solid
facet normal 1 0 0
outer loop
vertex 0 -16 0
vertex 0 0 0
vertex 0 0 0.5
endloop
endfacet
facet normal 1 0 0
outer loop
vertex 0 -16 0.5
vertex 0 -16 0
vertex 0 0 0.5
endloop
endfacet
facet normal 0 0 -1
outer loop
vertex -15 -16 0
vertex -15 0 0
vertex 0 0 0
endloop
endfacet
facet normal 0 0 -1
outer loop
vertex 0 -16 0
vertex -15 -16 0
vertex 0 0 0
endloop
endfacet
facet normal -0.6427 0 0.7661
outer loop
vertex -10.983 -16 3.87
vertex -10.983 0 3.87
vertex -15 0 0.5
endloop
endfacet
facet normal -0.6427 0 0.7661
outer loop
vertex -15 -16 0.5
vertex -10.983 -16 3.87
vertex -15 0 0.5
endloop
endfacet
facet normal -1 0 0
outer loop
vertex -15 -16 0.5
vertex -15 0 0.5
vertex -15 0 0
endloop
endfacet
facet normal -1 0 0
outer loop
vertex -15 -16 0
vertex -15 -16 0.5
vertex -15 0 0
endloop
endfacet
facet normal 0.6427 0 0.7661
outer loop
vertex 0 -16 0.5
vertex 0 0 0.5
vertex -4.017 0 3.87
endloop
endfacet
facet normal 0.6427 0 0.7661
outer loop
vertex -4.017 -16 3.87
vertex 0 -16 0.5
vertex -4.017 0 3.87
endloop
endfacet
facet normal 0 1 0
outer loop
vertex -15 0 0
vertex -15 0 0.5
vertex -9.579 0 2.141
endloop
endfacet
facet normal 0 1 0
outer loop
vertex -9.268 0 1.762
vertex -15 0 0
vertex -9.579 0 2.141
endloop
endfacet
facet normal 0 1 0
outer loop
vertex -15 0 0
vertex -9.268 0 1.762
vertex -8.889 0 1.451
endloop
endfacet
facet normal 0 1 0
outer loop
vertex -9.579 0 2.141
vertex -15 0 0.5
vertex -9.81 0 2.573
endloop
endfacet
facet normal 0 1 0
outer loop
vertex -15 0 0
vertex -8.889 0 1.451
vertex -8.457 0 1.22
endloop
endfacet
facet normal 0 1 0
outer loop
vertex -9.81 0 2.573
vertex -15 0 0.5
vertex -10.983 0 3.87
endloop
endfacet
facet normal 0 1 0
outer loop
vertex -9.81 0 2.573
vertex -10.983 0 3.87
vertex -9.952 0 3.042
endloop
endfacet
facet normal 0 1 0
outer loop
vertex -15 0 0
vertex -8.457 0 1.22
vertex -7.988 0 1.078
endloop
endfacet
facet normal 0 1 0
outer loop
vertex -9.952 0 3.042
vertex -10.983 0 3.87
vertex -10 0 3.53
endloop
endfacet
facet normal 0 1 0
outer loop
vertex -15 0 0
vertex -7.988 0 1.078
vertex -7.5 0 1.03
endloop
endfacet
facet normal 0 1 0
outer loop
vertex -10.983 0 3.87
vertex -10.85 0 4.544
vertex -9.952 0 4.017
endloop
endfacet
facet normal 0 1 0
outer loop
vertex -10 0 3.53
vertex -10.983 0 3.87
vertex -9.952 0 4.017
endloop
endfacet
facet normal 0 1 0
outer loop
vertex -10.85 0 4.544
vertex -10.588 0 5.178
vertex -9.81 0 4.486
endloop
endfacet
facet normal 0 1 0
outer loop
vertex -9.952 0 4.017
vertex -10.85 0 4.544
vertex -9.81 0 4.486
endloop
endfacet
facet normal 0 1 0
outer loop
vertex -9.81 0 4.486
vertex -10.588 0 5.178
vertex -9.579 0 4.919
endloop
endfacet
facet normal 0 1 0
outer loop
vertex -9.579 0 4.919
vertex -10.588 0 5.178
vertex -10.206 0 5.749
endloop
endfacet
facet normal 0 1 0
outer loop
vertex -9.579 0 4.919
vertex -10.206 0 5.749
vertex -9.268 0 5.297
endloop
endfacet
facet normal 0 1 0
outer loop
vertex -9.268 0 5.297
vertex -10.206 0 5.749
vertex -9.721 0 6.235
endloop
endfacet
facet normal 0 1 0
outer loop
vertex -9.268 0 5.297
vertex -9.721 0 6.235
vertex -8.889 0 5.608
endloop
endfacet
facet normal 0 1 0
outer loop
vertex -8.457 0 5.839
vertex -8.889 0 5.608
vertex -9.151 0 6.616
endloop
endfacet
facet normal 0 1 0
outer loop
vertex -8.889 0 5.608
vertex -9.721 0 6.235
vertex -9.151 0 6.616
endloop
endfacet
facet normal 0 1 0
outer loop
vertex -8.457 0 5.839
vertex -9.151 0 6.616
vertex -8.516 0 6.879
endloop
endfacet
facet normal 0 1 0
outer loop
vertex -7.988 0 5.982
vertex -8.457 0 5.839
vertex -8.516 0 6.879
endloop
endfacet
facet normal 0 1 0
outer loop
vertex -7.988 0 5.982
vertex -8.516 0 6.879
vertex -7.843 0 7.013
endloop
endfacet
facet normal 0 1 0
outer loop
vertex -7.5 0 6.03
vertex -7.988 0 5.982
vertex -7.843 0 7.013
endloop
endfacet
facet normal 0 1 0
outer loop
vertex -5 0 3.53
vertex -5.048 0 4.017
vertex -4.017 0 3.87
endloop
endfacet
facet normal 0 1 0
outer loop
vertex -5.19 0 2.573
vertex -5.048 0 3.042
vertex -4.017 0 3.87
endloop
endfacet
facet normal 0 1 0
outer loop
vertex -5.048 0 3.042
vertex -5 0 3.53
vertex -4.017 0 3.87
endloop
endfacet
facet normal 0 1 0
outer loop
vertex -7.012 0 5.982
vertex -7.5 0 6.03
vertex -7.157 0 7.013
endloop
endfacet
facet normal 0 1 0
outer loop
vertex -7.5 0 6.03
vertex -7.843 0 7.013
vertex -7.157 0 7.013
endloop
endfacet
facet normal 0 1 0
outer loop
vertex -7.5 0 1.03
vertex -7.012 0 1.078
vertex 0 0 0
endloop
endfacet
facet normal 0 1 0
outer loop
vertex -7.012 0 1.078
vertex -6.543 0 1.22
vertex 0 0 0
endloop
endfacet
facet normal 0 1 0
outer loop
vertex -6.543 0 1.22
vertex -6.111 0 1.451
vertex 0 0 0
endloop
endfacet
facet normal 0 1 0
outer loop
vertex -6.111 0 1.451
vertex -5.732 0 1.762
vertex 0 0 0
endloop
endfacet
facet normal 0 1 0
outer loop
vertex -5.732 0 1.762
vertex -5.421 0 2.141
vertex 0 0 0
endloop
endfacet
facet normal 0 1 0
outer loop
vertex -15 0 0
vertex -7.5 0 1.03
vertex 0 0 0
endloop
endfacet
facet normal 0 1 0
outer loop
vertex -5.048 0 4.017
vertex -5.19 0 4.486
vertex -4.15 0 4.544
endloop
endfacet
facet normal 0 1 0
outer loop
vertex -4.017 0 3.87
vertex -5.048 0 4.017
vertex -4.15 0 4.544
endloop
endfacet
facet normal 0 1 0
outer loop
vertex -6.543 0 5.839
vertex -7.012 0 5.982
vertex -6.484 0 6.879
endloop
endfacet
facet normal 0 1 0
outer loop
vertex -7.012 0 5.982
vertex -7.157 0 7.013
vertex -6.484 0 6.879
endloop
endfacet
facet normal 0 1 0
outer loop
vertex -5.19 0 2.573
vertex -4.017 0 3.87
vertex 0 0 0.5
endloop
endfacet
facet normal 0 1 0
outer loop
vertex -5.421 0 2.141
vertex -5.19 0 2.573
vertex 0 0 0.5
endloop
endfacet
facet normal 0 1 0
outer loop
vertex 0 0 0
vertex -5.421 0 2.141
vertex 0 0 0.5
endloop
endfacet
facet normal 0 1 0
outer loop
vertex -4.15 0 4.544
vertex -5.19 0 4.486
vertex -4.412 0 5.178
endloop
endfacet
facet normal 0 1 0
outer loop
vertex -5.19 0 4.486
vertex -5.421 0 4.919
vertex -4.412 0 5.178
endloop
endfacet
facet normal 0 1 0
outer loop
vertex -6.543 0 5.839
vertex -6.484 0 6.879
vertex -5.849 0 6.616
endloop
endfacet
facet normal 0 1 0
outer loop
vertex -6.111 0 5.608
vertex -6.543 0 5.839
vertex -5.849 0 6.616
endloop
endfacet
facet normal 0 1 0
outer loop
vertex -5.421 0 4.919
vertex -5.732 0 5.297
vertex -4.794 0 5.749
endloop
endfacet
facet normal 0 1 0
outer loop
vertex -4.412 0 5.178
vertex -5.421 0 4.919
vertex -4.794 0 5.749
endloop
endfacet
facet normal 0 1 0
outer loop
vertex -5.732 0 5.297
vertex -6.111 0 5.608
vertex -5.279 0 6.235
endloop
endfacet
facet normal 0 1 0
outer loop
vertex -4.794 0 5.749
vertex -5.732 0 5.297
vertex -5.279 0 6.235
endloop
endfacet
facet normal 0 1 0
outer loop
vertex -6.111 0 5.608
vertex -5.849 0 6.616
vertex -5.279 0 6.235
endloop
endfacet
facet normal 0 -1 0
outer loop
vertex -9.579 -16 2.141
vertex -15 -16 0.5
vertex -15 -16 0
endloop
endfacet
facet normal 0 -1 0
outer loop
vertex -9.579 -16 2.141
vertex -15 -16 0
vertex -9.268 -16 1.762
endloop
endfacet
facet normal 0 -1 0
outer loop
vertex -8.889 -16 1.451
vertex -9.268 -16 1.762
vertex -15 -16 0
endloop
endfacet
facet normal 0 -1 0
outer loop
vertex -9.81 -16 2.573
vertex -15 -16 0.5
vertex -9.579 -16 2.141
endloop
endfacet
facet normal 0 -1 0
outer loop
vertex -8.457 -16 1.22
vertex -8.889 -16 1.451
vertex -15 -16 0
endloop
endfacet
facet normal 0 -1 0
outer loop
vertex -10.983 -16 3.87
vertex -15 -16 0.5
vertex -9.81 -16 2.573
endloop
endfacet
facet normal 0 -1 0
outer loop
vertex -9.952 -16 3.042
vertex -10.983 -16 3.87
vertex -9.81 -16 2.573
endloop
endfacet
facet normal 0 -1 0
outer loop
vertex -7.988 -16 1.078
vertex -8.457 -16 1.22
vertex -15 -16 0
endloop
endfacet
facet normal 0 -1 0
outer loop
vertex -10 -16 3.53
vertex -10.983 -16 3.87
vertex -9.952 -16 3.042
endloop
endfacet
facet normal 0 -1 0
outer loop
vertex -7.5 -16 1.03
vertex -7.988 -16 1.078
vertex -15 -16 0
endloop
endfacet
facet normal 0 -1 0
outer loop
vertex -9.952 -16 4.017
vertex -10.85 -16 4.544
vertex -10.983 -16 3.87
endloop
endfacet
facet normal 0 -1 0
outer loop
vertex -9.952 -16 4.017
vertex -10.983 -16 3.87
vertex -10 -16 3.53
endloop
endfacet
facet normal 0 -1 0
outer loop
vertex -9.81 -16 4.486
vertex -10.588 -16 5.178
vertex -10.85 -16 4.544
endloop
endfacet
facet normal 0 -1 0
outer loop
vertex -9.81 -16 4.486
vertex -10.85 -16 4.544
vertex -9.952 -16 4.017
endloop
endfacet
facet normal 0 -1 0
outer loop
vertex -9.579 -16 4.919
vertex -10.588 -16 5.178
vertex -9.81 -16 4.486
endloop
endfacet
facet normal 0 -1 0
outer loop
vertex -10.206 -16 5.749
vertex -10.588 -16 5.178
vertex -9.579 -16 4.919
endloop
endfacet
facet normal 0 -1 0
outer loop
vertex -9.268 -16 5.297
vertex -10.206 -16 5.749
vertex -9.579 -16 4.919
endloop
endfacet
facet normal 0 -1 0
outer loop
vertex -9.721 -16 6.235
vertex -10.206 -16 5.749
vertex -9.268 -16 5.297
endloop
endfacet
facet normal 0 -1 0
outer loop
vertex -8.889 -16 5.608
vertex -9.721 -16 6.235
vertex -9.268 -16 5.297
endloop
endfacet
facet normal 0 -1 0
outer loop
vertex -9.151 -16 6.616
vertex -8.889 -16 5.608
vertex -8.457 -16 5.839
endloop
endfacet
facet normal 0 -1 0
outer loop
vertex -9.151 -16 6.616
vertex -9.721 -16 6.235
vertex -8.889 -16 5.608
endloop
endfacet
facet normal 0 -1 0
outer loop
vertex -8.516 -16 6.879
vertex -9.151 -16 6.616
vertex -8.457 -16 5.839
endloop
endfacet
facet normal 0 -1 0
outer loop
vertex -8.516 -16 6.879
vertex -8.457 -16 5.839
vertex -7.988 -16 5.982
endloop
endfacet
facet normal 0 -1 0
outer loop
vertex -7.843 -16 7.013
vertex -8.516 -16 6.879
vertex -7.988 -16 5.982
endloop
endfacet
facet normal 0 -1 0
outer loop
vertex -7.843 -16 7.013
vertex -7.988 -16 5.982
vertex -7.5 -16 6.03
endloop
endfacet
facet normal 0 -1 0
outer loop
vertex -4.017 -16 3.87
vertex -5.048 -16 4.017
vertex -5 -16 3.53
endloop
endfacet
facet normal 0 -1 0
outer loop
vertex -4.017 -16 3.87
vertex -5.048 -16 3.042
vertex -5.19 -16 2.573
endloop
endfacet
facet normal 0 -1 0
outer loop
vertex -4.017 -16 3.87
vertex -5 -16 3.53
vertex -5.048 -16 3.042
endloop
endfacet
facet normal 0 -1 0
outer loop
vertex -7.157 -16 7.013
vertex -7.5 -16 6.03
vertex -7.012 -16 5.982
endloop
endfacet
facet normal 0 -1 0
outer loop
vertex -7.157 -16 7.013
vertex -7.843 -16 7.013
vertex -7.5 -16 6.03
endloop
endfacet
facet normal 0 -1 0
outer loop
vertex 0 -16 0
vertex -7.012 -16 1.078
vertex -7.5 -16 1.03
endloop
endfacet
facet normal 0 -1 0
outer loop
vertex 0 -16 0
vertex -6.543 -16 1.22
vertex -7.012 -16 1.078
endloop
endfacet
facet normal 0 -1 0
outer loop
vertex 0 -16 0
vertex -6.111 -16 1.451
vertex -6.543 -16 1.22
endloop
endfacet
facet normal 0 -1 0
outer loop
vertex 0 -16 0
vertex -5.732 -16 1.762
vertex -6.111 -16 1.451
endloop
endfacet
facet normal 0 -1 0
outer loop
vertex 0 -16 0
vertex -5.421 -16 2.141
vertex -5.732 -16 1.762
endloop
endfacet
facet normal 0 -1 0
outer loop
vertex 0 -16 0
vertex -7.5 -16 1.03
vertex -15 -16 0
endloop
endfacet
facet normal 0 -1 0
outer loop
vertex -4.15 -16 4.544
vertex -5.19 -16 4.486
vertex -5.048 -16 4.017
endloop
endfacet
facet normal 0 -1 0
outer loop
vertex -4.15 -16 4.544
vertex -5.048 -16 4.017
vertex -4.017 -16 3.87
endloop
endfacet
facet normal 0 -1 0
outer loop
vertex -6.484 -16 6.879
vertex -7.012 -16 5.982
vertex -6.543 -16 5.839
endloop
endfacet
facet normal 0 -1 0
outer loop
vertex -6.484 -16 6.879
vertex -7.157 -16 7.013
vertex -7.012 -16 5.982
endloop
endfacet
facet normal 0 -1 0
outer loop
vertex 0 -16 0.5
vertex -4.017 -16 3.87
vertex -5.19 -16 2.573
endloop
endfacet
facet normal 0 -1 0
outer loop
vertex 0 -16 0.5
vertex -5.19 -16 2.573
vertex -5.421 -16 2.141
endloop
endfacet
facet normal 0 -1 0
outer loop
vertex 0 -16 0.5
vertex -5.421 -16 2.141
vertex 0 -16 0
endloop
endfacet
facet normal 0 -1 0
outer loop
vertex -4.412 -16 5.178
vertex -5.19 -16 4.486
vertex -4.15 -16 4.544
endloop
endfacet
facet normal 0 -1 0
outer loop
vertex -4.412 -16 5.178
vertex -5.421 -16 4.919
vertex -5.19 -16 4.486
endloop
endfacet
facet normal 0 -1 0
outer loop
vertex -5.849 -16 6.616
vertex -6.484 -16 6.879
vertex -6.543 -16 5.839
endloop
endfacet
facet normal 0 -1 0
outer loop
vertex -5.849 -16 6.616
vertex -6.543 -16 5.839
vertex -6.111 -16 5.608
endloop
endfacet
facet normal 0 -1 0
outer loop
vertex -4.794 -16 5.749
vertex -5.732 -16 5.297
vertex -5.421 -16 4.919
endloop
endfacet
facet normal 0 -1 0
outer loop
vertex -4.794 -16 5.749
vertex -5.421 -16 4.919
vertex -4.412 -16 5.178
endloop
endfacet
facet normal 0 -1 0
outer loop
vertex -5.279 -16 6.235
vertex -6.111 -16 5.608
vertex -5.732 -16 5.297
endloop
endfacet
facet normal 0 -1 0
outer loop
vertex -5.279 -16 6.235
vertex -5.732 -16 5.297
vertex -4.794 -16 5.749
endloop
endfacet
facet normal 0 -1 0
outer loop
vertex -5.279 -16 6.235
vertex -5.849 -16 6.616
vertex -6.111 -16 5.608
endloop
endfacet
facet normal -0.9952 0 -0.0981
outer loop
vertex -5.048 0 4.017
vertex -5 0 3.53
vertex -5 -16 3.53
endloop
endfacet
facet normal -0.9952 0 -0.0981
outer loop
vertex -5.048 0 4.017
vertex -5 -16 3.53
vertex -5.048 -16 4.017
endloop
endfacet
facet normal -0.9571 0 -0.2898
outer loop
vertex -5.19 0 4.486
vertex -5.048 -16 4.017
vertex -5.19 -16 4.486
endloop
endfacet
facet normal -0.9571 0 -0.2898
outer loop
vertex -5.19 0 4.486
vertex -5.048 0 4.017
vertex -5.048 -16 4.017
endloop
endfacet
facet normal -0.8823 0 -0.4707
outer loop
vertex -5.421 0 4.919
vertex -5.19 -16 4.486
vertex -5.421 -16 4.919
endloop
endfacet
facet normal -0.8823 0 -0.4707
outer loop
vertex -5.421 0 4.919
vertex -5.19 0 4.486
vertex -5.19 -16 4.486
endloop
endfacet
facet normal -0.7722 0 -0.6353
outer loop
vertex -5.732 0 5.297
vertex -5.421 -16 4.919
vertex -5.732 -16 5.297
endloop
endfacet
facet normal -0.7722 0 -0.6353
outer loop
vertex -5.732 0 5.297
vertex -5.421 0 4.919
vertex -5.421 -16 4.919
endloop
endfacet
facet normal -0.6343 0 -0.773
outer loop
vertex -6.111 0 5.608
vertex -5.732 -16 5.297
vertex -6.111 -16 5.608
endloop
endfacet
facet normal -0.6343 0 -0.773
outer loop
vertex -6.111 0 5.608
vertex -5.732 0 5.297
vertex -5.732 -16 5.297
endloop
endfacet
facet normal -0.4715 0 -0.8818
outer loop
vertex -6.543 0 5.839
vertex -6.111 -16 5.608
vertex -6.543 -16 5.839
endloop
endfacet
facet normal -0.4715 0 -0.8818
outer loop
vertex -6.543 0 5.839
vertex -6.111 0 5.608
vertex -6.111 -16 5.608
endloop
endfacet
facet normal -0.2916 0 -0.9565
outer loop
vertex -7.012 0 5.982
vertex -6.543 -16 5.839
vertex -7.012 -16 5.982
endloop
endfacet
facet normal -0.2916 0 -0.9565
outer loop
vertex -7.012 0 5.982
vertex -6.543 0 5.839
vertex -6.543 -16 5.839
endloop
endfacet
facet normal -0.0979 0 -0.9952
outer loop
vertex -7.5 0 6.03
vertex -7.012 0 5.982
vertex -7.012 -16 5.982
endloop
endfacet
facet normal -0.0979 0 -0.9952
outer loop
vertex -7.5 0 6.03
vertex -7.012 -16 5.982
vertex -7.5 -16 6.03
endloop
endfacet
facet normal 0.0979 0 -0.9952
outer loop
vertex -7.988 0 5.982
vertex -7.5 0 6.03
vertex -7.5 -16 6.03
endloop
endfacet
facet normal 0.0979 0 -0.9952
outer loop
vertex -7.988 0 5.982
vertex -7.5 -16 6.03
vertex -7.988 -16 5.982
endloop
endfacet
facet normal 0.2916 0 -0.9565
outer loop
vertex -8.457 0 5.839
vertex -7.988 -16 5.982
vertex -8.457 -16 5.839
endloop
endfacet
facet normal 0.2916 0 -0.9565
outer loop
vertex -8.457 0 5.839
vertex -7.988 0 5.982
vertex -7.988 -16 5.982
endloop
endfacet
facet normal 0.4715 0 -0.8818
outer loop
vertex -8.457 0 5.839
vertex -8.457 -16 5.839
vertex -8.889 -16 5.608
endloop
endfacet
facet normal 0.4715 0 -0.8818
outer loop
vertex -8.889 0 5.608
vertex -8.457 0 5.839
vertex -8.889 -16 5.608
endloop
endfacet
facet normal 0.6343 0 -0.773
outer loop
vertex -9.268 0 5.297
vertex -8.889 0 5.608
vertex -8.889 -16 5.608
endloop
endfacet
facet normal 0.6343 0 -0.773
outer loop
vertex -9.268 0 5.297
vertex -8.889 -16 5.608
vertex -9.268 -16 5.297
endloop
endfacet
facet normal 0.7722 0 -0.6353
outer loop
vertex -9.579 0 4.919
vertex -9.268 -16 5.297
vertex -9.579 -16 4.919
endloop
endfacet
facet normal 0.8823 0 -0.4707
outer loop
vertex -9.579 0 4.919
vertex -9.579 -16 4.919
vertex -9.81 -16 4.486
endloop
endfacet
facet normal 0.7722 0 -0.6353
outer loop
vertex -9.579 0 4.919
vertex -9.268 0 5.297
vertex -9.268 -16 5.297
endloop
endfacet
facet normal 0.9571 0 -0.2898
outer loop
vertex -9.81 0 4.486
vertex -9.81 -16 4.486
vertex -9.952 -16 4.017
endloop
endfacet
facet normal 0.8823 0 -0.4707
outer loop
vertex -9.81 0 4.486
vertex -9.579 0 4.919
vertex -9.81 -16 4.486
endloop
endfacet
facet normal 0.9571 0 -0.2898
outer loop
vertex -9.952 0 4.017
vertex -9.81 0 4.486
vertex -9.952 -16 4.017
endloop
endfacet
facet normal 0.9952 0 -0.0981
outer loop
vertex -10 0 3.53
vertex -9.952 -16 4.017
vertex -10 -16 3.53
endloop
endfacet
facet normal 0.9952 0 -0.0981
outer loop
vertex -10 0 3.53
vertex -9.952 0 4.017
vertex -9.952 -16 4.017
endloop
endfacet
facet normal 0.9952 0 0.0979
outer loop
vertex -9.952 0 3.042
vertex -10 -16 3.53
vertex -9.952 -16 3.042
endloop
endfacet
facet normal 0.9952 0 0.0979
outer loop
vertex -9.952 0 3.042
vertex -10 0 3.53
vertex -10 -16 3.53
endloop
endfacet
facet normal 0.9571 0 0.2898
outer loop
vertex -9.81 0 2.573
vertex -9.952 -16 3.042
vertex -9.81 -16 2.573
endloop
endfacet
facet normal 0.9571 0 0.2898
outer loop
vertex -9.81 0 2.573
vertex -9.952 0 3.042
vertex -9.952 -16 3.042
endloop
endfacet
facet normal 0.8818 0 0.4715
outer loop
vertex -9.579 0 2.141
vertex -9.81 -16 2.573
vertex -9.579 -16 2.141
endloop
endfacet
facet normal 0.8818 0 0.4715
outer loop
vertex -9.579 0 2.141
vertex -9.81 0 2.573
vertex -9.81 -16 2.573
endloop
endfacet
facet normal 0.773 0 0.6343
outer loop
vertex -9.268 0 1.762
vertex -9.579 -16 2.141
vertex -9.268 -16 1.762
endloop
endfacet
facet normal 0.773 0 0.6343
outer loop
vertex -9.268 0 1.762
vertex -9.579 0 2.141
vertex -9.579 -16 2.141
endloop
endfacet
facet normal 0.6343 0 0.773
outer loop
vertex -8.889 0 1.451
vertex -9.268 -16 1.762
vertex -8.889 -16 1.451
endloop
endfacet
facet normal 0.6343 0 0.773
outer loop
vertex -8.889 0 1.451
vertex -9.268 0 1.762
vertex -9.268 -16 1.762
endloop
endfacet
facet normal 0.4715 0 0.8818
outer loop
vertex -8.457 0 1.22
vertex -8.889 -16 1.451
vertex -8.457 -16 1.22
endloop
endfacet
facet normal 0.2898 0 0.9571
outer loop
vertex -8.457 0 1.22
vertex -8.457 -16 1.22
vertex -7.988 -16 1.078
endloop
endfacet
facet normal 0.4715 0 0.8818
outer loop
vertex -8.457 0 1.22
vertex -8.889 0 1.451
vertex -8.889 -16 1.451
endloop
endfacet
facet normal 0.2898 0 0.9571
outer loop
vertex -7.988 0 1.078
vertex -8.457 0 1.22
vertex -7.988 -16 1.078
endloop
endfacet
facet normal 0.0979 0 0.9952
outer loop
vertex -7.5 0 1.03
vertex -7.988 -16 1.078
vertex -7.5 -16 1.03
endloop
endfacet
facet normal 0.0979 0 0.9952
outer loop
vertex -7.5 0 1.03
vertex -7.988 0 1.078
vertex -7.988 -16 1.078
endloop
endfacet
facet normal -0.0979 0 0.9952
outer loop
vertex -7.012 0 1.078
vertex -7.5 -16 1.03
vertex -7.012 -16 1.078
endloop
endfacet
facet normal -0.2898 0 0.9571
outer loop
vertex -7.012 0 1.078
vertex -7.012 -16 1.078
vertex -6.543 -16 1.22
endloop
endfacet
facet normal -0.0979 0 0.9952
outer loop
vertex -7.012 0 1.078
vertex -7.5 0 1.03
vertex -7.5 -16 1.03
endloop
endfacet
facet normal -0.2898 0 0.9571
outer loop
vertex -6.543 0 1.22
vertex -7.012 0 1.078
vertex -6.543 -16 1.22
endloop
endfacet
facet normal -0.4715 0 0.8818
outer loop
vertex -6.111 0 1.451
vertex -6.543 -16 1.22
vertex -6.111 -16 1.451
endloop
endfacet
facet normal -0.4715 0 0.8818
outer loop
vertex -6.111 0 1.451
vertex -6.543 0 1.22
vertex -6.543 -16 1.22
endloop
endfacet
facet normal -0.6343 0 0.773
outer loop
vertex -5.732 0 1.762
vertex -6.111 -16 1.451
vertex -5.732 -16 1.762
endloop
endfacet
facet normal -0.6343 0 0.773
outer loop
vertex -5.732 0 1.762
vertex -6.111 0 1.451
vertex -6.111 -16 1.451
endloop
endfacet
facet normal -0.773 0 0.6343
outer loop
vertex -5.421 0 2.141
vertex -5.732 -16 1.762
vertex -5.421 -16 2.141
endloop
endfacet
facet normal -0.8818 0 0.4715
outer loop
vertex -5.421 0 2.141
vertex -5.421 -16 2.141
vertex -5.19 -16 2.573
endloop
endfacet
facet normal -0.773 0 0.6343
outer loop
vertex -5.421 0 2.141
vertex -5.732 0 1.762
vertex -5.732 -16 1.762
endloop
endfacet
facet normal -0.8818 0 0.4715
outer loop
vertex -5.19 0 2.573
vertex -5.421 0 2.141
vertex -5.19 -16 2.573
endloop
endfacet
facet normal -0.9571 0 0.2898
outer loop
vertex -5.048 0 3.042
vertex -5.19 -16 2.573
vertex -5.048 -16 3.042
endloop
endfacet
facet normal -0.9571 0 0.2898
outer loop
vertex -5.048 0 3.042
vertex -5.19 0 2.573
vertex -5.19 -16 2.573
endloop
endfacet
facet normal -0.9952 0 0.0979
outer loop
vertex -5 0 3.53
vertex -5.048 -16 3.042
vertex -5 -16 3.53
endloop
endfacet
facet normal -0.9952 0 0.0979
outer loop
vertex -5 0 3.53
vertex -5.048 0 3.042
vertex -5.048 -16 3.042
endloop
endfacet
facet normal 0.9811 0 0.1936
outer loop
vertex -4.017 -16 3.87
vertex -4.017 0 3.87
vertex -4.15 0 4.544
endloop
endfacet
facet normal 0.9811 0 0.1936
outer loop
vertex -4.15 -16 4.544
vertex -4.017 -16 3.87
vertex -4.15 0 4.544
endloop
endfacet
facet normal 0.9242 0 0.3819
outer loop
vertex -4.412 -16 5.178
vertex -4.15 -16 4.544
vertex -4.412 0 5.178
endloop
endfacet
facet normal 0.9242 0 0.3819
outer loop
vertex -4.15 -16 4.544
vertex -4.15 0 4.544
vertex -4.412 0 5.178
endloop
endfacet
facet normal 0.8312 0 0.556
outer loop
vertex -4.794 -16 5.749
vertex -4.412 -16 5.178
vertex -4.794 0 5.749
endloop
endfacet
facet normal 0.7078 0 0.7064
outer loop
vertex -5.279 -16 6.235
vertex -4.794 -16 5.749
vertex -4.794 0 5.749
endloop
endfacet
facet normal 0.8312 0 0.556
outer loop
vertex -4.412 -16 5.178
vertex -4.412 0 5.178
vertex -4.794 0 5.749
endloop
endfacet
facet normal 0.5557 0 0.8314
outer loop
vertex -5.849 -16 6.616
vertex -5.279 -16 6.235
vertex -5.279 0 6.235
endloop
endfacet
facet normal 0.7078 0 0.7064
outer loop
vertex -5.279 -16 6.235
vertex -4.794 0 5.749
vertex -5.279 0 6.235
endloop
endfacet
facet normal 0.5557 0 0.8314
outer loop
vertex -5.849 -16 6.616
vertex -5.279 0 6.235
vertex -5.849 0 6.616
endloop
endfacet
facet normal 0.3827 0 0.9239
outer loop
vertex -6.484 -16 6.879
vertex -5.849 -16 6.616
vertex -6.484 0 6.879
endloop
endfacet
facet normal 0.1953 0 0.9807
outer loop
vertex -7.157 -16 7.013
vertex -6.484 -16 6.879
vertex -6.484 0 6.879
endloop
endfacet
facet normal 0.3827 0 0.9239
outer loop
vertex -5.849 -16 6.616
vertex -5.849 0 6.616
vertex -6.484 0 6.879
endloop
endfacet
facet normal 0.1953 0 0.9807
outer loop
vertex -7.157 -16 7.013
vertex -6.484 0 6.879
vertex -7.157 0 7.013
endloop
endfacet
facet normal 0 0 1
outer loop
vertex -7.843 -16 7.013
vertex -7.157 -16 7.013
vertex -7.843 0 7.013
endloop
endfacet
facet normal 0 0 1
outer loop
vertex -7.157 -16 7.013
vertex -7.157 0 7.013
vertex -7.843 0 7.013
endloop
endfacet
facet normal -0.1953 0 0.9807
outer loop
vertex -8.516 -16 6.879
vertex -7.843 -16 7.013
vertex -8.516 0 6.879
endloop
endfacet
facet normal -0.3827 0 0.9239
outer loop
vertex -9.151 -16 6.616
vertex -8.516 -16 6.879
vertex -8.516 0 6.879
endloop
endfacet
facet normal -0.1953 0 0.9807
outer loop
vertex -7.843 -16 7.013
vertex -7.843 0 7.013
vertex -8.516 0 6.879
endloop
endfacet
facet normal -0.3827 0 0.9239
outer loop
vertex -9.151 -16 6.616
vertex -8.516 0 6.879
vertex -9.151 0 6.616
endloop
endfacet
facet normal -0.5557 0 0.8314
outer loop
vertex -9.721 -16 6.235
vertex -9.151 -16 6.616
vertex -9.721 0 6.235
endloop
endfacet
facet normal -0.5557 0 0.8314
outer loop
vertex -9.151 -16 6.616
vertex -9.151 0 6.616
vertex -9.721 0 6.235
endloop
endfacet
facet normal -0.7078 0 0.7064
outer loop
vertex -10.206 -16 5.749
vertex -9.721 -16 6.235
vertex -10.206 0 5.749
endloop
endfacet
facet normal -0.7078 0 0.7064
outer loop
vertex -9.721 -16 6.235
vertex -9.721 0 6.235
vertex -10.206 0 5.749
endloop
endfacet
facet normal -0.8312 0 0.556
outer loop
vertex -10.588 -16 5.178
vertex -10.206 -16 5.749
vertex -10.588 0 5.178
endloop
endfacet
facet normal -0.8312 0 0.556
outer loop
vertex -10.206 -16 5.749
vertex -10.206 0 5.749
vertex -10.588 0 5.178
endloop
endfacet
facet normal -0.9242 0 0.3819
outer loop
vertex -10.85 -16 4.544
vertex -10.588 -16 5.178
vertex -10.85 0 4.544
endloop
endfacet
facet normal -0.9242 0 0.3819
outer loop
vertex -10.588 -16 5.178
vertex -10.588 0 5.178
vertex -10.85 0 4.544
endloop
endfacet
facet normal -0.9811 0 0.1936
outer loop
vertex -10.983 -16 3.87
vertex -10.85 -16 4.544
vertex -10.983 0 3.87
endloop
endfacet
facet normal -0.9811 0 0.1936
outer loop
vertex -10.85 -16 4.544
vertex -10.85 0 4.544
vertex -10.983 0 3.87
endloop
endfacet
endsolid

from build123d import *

# Parameters (mm, degrees)
F0_R     = 2.5
F1_DEPTH = 16


with BuildPart() as f1:
    # F0 (on Front) → F1 (new body)
    with BuildSketch(Plane.XZ):
        with BuildLine():
            Line((-15, 0), (0, 0))
            Line((0, 0), (0, 0.5))
            Line((0, 0.5), (-4.016613, 3.870338))
            ThreePointArc((-4.016613, 3.870338), (-7.5, 7.029729), (-10.983387, 3.870338))
            Line((-10.983387, 3.870338), (-15, 0.5))
            Line((-15, 0.5), (-15, 0))
        make_face()
        with Locations((-7.5, 3.529729)):
            Circle(F0_R, mode=Mode.SUBTRACT)
    extrude(amount=F1_DEPTH)


solid = f1.part
